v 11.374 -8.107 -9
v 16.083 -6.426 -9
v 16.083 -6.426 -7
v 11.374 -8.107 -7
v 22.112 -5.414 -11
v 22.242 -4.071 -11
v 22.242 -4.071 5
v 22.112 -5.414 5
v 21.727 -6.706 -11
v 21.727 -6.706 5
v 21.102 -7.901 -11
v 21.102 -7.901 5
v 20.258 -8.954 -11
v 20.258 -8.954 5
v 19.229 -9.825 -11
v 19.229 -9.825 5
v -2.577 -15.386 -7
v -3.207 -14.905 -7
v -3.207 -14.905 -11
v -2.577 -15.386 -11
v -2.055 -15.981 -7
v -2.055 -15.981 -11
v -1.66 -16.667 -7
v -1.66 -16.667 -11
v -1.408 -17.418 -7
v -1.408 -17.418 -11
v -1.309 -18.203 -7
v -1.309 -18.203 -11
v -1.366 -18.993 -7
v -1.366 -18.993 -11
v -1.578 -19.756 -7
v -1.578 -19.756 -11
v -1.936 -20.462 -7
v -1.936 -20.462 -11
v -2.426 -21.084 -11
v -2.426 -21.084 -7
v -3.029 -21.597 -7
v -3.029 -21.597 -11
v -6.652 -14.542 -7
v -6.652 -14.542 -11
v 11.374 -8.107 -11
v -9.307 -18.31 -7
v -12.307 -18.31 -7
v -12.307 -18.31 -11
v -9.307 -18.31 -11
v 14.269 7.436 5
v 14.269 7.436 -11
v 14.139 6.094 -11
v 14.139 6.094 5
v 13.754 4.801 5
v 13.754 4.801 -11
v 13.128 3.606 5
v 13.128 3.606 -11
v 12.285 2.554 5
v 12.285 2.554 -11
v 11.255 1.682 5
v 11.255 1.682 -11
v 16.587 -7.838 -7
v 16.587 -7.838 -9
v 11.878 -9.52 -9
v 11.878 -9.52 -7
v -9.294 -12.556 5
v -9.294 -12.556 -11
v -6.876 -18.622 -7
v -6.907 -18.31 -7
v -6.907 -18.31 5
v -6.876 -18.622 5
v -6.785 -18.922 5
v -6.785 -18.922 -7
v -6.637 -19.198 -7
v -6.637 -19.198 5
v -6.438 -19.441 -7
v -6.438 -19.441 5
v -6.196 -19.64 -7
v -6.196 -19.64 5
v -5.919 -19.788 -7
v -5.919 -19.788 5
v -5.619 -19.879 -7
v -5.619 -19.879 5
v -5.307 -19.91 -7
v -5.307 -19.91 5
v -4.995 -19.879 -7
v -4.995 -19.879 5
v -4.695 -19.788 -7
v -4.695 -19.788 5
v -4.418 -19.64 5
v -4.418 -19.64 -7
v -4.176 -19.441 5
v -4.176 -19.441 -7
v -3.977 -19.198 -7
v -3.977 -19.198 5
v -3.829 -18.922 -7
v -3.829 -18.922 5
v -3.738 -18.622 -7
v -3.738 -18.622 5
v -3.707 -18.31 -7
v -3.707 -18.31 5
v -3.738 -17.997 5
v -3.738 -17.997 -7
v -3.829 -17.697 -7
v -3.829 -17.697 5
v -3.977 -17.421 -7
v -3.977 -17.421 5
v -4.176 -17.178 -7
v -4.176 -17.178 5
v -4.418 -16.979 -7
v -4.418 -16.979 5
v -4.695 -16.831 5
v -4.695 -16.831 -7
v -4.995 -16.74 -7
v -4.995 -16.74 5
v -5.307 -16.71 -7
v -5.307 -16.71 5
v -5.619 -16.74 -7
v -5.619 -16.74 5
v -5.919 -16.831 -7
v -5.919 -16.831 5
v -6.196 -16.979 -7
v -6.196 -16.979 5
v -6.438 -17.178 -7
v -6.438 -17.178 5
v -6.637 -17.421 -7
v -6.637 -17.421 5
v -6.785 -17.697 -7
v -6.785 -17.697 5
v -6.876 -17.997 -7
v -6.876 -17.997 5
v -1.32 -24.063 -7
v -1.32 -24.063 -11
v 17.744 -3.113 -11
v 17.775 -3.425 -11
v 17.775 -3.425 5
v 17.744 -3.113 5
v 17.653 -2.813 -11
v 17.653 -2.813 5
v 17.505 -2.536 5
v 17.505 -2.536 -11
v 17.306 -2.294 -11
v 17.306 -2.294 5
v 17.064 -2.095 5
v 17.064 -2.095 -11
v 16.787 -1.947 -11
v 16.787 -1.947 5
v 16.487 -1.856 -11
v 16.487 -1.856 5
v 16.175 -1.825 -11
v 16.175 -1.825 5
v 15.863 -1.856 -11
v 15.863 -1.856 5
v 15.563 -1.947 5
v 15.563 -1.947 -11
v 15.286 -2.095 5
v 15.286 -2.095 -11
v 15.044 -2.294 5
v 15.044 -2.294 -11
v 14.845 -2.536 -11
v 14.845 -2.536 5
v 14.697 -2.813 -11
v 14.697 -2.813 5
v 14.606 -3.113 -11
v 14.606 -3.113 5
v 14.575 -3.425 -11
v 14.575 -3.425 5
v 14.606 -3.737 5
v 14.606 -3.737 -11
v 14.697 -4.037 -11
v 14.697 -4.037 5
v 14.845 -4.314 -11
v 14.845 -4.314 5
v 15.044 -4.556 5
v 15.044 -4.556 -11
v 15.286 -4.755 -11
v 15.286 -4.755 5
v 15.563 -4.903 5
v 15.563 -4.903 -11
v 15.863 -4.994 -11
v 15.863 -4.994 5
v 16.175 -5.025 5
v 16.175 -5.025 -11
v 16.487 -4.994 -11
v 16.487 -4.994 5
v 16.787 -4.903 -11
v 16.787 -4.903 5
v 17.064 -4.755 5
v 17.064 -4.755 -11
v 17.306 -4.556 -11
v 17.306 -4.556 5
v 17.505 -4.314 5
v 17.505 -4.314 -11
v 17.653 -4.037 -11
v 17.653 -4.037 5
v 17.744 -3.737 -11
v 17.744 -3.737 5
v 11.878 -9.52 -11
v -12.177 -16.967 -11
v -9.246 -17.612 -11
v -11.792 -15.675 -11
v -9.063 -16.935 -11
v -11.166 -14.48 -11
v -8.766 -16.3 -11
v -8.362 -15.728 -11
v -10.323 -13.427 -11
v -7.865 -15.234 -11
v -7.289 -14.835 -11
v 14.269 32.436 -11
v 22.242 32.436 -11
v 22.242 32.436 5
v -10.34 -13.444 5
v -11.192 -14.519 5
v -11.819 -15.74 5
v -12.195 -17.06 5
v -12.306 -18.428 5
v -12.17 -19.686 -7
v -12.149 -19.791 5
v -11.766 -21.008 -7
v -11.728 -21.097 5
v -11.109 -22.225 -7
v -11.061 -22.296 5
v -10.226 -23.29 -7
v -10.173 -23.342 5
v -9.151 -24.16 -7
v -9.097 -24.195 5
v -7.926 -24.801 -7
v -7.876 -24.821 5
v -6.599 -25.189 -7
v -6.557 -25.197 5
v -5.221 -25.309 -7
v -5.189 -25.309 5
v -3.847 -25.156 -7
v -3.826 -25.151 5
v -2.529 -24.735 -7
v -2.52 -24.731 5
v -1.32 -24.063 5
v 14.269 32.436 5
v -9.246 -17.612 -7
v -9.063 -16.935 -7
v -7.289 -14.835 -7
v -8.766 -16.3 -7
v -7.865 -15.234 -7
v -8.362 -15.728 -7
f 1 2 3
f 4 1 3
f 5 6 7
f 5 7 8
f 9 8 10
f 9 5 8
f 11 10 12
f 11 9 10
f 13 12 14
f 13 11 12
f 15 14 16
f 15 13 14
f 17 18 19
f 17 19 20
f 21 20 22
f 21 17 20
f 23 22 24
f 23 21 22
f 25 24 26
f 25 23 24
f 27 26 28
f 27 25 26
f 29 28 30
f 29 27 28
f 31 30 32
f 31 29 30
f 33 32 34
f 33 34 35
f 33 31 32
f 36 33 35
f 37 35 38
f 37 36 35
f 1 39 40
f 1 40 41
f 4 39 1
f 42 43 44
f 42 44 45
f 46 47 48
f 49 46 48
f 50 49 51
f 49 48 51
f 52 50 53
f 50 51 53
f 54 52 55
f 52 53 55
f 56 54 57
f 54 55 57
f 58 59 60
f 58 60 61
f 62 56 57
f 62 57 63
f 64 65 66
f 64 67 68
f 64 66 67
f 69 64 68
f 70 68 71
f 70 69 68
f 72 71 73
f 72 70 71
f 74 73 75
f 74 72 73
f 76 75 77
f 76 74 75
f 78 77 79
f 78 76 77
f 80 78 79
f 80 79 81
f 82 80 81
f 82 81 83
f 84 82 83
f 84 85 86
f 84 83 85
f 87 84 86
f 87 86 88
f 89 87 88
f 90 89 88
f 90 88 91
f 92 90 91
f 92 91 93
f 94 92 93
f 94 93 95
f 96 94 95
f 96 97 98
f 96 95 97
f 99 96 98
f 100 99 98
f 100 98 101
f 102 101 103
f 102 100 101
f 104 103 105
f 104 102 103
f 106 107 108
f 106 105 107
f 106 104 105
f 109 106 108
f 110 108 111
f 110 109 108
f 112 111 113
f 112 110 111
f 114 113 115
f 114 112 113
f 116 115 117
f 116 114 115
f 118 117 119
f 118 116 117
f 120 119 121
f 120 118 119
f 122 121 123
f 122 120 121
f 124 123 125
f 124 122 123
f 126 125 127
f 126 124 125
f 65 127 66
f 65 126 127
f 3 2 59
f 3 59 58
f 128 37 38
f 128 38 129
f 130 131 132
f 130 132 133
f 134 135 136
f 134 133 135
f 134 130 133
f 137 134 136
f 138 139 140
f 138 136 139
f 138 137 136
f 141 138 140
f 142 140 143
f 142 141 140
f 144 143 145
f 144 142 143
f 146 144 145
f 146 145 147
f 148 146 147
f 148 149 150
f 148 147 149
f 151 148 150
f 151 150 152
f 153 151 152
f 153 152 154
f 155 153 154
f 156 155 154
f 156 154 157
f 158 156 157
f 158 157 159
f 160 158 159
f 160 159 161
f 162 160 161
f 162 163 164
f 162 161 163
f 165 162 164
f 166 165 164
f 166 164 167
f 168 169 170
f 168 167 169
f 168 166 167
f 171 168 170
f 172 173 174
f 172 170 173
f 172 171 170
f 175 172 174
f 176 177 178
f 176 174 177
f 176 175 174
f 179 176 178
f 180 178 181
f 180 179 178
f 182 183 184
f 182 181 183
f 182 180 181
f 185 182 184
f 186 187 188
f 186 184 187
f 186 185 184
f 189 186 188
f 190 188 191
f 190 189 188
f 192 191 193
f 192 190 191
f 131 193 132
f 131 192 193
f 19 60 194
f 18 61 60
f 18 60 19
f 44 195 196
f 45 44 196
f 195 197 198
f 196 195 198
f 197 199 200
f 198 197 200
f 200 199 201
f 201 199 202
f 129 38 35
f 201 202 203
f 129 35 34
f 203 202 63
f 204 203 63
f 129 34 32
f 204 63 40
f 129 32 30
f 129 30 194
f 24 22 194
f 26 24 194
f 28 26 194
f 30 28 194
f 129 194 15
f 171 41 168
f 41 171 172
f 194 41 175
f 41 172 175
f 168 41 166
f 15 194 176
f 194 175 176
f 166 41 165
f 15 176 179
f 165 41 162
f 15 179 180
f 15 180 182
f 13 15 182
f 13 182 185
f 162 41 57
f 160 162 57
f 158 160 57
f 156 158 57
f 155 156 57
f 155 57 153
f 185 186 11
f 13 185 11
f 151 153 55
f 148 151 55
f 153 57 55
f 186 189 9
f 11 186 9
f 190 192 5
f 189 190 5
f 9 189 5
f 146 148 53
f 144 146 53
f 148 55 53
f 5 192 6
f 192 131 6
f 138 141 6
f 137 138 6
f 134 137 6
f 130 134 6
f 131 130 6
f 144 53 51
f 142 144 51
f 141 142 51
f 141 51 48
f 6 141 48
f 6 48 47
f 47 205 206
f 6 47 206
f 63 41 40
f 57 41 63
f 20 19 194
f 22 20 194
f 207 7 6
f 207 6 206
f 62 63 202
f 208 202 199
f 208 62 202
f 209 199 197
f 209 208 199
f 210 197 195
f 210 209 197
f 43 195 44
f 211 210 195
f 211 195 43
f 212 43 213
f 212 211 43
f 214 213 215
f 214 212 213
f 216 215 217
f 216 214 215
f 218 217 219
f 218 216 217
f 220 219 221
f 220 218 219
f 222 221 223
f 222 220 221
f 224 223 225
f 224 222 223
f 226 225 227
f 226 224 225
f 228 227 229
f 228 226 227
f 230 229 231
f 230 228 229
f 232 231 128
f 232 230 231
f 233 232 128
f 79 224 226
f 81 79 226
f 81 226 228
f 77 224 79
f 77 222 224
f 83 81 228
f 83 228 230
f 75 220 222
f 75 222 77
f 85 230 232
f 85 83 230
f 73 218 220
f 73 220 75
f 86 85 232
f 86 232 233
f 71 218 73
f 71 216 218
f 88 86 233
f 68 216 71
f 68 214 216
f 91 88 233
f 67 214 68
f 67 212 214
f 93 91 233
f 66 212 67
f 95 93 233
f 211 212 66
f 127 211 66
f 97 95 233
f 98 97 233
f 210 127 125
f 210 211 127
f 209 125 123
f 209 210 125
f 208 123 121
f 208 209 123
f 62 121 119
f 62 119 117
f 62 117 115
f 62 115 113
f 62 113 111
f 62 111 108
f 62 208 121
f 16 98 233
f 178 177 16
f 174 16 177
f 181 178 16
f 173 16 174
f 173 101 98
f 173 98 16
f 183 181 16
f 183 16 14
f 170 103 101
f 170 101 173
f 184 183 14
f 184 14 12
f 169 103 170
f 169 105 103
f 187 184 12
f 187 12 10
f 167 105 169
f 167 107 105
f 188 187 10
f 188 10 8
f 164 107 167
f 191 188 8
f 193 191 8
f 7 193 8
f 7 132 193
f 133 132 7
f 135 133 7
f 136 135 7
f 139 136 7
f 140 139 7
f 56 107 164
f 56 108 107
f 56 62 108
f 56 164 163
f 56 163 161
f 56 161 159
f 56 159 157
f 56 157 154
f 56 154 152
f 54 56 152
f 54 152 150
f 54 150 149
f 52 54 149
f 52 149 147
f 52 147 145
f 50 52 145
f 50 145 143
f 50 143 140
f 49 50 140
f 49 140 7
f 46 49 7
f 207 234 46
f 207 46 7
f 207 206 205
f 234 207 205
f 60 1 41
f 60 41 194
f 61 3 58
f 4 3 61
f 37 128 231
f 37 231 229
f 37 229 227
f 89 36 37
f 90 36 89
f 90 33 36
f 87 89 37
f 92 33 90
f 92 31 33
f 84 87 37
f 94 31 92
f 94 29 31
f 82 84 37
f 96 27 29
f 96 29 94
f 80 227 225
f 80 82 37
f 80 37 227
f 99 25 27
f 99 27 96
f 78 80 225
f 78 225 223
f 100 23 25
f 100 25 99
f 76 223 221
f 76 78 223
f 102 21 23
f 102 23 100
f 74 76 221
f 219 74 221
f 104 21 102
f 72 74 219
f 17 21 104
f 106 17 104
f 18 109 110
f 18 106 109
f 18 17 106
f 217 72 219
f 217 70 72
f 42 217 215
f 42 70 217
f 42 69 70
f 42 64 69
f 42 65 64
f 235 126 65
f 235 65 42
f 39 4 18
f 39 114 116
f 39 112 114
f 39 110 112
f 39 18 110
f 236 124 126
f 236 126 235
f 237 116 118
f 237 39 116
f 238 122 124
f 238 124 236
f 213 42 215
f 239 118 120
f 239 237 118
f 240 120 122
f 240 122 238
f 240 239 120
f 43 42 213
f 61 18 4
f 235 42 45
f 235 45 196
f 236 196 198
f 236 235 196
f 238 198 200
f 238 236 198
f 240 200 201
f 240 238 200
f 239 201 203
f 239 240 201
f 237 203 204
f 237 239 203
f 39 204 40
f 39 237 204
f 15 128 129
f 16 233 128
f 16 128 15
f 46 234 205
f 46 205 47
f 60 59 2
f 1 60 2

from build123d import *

# Parameters (mm, degrees)
EXTRUDE_1_DEPTH          = 22
CUT_EXTRUDE_START        = -4
CUT_EXTRUDE_1_DEPTH      = 4
SKETCH_3_W               = 2
SKETCH_3_H               = 1.5
CUT_EXTRUDE_2_DEPTH      = 5
FILLET_1_R               = 7
CUT_EXTRUDE_3_DEPTH      = 55.478956816
CUT_EXTRUDE_3_DEPTH_BACK = 55.478956816
SKETCH_11_W              = 74.866363777
SKETCH_11_H              = 10.751937883
CUT_EXTRUDE_4_DEPTH      = 43.459689965
CUT_EXTRUDE_4_DEPTH_BACK = 43.459689965
SKETCH_12_R              = 1.6


with BuildPart() as part:
    # 草图1 → 凸台-拉伸1 (new body)
    with BuildSketch(Plane.XY.offset(11)):
        with BuildLine():
            Line((22.242183112, 32.436253827), (14.268783679, 32.436253827))
            Line((14.268783679, 32.436253827), (14.268783679, 3.77031158))
            Line((14.268783679, 3.77031158), (-9.293805711, -12.555760396))
            ThreePointArc((-9.293805711, -12.555760396), (-11.060906945, -22.296261062), (-1.320406278, -24.063362296))
            Line((-1.320406278, -24.063362296), (22.242183112, -7.73729032))
            Line((22.242183112, -7.73729032), (22.242183112, 32.436253827))
        make_face()
    extrude(amount=-EXTRUDE_1_DEPTH)

    # 草图2 → 切除-拉伸1 (cut)
    with BuildSketch(Plane(origin=(0, 0, -11), x_dir=(-1, 0, 0), z_dir=(0, 0, -1)).offset(CUT_EXTRUDE_START)):
        with BuildLine():
            Line((6.652022195, -14.542440374), (-11.373854522, -8.10694393))
            Line((-11.373854522, -8.10694393), (-11.878198097, -9.519614294))
            Line((-11.878198097, -9.519614294), (3.206970754, -14.905235866))
            ThreePointArc((3.206970754, -14.905235866), (1.308519825, -18.203219238), (3.028991871, -21.597447603))
            Line((3.028991871, -21.597447603), (1.320406278, -24.063362296))
            ThreePointArc((1.320406278, -24.063362296), (8.554651374, -24.510645848), (12.307105995, -18.309561346))
            Line((12.307105995, -18.309561346), (9.307105995, -18.309561346))
            ThreePointArc((9.307105995, -18.309561346), (8.576636909, -16.005181256), (6.652022195, -14.542440374))
        make_face()
    extrude(amount=CUT_EXTRUDE_1_DEPTH, mode=Mode.SUBTRACT)

    # 草图3 → 切除-拉伸2 (cut)
    with BuildSketch(Plane(origin=(7.520945342, 2.685085323, 0), x_dir=(0, 0, 1), z_dir=(-0.9417802429021499, -0.3362290500227003, 0))):
        with Locations((-8, -12.209179925)):
            Rectangle(SKETCH_3_W, SKETCH_3_H)
    extrude(amount=-CUT_EXTRUDE_2_DEPTH, mode=Mode.SUBTRACT)

    # 圆角1
    fillet_1_edges = [part.edges().sort_by_distance(p)[0] for p in [
        (22.242183112, -7.73729032, 0),
        (14.268783679, 3.77031158, 0),
    ]]
    fillet(fillet_1_edges, radius=FILLET_1_R)

    # 草图11 → 切除-拉伸3 (cut, two sides: drawn at the far end of the back side and taken through both)
    with BuildSketch(Plane(origin=(10.836641759, -15.639973933, 0), x_dir=(0.8219715642635482, 0.5695285309289919, 0), z_dir=(0.5695285309289919, -0.8219715642635482, 0)).offset(-CUT_EXTRUDE_3_DEPTH_BACK)):
        with Locations((13.262652651, 10.375968942)):
            Rectangle(SKETCH_11_W, SKETCH_11_H)
    extrude(amount=CUT_EXTRUDE_3_DEPTH + CUT_EXTRUDE_3_DEPTH_BACK, mode=Mode.SUBTRACT)

    # 草图12 → 切除-拉伸4 (cut, two sides: drawn at the far end of the back side and taken through both)
    with BuildSketch(Plane.XY.offset(5).offset(-CUT_EXTRUDE_4_DEPTH_BACK)):
        with Locations(Location((-5.307105995, -18.309561346, 0), (0, 0, 180))):
            Circle(SKETCH_12_R)
        with Locations((16.17499904, -3.425017581)):
            Circle(SKETCH_12_R)
    extrude(amount=CUT_EXTRUDE_4_DEPTH + CUT_EXTRUDE_4_DEPTH_BACK, mode=Mode.SUBTRACT)


solid = part.part
